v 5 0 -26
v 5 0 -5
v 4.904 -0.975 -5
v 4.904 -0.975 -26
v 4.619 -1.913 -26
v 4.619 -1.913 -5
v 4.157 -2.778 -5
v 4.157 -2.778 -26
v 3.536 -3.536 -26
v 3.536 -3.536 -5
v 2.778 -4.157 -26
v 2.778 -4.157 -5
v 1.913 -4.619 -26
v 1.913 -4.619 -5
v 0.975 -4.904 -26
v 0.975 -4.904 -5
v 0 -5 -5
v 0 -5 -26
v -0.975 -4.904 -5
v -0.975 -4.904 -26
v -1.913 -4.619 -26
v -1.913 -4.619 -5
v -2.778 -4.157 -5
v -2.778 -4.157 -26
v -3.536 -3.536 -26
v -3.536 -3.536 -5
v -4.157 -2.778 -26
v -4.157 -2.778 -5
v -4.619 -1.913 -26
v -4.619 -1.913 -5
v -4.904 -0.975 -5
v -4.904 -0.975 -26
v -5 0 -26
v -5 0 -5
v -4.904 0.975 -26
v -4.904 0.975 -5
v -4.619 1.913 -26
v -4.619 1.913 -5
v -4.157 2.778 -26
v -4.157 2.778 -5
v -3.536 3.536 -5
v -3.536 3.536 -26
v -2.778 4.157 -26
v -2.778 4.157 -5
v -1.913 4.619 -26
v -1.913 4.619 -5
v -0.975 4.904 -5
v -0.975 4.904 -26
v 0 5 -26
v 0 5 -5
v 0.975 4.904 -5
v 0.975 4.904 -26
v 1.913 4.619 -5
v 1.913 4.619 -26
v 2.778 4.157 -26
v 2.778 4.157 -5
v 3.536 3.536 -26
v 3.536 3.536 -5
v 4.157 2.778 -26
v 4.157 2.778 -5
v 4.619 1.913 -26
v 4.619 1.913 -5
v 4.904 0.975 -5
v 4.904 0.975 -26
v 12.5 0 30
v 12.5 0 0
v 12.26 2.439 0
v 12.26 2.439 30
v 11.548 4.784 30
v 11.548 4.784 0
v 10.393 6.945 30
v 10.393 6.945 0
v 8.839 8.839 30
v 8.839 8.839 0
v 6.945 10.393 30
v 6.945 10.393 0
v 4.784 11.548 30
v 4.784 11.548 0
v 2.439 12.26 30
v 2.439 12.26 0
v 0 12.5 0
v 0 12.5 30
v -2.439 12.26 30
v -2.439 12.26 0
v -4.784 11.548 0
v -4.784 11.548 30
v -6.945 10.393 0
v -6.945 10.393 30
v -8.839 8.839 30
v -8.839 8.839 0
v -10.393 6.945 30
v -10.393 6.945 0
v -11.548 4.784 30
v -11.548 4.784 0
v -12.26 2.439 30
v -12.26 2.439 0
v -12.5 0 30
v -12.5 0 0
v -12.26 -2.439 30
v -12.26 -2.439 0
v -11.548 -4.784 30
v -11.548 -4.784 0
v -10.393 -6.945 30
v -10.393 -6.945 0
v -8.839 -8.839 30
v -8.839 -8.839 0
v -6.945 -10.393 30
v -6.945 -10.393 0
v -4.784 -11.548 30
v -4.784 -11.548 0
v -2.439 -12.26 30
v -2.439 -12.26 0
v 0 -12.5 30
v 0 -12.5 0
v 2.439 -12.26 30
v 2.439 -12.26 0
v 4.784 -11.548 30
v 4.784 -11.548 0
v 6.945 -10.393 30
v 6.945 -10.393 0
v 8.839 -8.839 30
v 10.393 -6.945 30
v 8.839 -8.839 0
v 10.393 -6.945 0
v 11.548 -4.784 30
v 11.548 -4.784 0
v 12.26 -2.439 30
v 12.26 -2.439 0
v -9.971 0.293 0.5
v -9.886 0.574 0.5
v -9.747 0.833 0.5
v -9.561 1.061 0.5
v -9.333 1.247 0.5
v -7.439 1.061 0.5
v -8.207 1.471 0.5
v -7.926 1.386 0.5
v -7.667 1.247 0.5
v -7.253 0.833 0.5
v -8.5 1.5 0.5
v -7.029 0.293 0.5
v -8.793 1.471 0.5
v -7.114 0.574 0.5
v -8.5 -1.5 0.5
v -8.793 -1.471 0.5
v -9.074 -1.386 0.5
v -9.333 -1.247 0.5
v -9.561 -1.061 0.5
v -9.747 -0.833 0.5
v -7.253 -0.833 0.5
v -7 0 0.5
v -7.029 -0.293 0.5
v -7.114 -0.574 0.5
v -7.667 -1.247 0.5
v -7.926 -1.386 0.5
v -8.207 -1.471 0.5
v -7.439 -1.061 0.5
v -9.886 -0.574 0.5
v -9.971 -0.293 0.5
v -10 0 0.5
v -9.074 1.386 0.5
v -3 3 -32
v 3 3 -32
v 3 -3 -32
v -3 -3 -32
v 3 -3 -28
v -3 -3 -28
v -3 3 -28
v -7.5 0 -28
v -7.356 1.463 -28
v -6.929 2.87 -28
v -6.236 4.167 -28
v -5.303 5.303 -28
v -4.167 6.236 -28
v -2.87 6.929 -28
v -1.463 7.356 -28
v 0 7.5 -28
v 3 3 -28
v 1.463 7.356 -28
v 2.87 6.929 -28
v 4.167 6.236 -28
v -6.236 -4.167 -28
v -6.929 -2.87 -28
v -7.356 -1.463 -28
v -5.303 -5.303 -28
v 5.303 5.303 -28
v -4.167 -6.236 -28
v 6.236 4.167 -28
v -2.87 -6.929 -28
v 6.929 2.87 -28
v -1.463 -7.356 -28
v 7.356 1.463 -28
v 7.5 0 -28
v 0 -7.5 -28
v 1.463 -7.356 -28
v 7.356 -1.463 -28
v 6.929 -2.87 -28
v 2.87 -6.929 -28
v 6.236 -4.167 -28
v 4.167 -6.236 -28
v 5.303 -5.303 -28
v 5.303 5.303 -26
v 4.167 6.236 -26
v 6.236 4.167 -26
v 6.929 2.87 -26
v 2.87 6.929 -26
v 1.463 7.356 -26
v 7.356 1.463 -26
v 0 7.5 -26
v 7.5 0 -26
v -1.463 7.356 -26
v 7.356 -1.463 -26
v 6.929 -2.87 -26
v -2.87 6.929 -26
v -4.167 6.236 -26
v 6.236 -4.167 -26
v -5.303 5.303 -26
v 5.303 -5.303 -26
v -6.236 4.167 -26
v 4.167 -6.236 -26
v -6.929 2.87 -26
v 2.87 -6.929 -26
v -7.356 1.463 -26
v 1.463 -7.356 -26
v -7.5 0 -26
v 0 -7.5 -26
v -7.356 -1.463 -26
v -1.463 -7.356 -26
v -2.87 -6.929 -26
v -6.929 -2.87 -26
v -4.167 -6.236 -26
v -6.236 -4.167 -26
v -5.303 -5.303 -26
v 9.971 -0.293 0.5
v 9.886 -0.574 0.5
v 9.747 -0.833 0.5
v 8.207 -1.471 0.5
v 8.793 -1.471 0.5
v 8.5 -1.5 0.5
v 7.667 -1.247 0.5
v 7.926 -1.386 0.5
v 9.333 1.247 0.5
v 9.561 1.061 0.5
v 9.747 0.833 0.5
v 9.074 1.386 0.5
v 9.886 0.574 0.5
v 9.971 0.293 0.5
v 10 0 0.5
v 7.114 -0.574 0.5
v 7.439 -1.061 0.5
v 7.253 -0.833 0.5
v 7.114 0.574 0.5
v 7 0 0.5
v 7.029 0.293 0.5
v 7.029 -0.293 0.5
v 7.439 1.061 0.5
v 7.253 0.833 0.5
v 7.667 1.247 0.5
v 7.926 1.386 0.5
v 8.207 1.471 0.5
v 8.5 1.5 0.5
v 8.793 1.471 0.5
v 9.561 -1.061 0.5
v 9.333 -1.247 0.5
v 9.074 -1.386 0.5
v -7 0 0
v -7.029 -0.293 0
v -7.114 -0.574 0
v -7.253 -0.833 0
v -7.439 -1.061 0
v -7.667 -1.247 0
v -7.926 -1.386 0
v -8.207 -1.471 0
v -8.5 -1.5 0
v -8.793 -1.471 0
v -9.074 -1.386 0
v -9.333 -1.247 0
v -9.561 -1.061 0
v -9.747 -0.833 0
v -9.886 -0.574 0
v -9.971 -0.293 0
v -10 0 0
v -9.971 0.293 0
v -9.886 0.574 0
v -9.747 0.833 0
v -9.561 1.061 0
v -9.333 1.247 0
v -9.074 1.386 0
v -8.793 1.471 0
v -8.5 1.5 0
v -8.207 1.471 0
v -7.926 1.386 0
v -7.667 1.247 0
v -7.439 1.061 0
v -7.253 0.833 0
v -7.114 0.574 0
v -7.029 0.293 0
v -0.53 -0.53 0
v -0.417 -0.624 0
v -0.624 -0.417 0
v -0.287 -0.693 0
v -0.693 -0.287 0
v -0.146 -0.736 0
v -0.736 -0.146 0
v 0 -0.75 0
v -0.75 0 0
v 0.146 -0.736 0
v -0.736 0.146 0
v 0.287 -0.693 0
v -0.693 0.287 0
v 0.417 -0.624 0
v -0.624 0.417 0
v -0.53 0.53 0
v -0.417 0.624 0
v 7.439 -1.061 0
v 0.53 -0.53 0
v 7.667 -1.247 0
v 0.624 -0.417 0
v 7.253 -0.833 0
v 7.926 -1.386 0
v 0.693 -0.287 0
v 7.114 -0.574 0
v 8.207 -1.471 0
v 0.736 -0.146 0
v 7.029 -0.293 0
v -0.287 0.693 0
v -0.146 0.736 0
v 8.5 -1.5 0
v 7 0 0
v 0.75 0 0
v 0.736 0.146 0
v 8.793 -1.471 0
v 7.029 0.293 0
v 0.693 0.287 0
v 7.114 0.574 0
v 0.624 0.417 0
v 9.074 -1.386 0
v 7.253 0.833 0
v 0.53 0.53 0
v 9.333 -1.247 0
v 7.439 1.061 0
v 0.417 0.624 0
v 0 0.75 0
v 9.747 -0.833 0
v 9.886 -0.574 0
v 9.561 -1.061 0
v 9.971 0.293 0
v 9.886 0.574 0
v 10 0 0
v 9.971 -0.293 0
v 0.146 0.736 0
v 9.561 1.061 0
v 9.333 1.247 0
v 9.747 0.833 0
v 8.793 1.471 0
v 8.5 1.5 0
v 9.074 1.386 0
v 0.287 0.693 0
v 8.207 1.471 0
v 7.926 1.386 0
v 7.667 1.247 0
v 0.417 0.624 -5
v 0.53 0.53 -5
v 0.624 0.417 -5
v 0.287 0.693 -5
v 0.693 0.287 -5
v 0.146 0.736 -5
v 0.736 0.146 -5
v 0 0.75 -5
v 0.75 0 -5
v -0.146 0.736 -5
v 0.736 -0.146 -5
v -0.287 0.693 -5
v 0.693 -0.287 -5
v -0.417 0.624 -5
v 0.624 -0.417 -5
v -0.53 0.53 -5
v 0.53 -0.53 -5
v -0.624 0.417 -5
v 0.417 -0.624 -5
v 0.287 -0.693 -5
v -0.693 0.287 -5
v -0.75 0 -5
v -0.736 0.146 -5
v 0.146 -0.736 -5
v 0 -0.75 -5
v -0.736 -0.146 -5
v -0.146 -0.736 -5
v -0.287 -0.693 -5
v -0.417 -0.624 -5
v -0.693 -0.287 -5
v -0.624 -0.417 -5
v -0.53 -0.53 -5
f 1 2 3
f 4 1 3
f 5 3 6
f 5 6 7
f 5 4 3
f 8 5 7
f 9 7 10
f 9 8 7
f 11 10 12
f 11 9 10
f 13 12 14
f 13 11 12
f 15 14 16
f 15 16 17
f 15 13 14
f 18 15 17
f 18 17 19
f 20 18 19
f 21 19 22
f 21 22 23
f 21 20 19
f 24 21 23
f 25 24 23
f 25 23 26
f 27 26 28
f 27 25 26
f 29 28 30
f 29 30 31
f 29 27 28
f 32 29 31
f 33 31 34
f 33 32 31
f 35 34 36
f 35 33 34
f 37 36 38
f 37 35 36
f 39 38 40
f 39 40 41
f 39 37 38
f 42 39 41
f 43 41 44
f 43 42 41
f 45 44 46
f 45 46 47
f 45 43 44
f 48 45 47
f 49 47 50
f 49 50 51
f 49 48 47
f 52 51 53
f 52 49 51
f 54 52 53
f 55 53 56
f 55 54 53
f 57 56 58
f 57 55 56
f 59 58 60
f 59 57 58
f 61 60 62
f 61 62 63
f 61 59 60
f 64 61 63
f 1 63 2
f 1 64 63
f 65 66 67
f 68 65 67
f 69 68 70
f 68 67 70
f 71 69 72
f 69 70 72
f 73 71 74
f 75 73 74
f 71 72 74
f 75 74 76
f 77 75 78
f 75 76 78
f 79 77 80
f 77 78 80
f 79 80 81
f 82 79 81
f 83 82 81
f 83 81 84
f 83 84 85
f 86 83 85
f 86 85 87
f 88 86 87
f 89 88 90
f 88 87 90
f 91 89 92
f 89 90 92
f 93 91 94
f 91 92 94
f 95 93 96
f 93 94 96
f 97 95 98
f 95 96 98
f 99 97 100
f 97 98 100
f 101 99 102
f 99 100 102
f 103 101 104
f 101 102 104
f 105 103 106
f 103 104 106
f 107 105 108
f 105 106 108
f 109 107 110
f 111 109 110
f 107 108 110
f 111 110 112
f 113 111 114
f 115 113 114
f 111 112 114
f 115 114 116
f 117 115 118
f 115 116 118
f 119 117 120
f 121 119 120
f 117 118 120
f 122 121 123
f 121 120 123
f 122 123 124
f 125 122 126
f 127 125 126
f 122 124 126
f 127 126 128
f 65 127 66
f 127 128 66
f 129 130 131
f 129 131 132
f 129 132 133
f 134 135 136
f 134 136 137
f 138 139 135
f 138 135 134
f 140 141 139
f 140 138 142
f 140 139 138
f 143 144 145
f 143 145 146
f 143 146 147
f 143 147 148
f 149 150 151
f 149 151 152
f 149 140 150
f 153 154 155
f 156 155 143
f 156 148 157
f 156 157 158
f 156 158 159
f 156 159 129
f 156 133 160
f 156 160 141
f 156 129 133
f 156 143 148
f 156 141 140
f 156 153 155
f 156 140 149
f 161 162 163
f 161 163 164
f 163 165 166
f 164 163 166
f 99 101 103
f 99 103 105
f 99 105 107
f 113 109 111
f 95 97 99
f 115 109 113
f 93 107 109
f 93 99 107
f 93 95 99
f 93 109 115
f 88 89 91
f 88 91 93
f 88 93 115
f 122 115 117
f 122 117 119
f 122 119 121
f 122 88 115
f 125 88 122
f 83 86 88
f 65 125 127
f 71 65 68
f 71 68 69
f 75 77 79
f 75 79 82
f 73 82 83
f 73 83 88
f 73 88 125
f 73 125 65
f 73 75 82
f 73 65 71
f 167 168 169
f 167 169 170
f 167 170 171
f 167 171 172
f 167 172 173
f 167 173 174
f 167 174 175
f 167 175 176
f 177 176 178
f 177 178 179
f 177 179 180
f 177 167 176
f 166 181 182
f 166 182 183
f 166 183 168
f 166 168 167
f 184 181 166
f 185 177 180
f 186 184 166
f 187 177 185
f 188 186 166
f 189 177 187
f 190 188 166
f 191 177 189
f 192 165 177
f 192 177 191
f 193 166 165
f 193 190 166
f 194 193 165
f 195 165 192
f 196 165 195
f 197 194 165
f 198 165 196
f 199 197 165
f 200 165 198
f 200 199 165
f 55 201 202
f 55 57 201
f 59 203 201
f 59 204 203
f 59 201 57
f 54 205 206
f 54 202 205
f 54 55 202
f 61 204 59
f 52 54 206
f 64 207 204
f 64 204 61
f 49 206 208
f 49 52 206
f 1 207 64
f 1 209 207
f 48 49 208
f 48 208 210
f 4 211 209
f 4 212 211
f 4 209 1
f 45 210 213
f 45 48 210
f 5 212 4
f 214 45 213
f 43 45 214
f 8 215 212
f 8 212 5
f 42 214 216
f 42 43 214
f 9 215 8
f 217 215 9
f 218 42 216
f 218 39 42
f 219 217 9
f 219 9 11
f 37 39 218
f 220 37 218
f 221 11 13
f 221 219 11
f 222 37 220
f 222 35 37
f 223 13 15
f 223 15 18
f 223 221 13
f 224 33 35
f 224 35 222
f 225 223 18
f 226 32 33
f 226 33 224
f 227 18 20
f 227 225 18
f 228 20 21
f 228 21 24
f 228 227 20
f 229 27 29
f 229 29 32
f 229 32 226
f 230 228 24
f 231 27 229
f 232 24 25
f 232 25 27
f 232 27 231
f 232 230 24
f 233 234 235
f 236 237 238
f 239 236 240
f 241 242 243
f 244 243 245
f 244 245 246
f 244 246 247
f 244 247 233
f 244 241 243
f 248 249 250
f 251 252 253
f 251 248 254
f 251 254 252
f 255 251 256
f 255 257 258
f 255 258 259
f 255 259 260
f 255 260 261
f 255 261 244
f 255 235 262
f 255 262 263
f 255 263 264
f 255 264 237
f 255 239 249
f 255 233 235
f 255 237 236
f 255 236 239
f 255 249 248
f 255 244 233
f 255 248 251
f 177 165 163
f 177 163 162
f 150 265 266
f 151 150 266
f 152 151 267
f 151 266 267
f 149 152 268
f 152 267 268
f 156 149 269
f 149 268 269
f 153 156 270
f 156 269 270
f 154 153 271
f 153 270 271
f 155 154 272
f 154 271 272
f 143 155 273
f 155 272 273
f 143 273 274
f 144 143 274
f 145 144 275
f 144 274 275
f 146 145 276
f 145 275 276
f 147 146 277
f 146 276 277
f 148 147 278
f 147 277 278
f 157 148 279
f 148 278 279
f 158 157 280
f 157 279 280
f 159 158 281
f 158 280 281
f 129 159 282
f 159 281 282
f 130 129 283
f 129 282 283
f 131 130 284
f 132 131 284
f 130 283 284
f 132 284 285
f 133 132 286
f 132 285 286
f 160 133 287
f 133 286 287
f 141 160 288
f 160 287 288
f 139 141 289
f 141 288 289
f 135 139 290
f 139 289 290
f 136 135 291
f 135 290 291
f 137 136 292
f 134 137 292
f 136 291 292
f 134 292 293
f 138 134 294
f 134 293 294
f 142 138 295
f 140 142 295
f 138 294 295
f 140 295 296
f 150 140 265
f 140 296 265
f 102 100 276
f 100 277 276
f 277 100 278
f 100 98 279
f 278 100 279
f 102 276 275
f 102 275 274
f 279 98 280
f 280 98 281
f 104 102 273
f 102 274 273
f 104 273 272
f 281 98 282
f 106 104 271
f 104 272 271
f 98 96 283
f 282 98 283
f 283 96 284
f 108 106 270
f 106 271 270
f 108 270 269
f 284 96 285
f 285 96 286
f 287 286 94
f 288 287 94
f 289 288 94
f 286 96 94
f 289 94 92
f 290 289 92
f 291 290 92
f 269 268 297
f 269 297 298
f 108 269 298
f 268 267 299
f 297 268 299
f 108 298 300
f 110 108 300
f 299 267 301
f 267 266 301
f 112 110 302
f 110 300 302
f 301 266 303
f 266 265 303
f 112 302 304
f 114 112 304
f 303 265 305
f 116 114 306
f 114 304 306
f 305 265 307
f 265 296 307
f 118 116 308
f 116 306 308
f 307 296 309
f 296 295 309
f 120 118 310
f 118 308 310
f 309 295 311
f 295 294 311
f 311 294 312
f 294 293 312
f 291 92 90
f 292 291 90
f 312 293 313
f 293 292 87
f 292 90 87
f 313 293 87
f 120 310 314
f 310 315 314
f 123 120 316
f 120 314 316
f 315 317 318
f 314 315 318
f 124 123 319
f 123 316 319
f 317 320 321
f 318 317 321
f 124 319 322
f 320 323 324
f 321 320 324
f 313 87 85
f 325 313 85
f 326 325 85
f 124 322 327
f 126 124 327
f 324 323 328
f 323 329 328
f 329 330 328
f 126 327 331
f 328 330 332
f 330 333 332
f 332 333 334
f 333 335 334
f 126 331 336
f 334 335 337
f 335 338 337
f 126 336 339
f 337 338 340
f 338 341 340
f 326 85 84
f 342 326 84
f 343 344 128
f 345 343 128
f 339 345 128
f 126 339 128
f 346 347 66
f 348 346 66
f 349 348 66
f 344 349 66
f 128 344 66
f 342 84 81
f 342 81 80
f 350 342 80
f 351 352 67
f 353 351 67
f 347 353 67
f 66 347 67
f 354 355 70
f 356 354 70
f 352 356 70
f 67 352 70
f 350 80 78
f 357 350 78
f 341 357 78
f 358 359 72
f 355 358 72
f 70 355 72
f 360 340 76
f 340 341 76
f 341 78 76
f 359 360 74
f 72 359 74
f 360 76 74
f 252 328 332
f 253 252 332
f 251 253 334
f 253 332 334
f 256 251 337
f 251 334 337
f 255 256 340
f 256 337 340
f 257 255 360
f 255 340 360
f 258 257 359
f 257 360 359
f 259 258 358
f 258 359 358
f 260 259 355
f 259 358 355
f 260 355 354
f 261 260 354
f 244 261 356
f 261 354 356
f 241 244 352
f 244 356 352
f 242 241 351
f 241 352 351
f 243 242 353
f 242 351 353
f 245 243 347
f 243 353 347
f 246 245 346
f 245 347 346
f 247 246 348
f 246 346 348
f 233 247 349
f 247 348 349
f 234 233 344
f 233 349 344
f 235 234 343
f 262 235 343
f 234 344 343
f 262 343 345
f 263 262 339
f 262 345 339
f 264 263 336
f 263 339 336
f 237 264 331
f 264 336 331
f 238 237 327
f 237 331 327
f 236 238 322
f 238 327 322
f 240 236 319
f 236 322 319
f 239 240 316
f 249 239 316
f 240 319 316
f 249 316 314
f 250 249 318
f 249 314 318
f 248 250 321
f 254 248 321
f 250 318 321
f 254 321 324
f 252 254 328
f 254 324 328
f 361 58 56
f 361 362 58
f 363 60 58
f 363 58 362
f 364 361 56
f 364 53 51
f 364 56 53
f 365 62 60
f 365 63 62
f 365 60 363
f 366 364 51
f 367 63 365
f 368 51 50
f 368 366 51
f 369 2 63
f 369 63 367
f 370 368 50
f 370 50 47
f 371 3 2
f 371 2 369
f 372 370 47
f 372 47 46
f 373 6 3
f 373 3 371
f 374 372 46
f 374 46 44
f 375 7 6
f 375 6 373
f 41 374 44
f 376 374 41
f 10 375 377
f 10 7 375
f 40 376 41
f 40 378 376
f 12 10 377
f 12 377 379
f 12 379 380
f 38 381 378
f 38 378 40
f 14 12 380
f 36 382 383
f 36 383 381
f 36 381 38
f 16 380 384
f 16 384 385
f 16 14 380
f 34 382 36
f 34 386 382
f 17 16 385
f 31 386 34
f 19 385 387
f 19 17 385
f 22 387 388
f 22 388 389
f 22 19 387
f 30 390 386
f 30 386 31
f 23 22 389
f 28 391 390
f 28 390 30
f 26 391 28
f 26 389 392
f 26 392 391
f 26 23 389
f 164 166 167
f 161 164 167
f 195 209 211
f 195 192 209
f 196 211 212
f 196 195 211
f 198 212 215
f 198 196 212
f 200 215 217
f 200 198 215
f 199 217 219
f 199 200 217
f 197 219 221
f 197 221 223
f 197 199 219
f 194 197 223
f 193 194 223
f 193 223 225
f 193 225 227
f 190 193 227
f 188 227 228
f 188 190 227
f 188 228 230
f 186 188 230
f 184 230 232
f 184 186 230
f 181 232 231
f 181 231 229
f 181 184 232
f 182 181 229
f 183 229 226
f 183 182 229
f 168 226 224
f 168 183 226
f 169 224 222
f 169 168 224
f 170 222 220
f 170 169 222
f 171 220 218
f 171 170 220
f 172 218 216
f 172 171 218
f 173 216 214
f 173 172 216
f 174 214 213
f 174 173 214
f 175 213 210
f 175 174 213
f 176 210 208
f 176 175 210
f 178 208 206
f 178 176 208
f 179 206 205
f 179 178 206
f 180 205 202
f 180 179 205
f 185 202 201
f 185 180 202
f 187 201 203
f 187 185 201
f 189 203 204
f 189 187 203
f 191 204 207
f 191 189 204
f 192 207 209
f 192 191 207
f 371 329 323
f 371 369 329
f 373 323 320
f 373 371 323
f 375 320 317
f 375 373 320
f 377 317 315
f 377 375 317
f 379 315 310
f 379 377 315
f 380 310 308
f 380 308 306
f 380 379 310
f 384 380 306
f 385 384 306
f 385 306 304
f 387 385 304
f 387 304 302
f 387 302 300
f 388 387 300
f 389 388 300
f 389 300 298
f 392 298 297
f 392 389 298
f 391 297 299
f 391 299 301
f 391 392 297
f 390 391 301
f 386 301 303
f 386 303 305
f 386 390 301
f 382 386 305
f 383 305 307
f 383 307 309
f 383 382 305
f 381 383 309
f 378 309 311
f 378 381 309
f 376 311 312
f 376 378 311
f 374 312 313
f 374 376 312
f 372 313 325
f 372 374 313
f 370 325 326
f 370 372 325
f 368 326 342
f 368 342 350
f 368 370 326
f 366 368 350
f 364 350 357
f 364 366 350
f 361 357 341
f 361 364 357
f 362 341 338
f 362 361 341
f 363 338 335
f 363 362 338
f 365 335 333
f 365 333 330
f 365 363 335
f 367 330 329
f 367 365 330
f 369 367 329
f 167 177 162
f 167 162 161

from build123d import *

# Parameters (mm, degrees)
SKETCH_1_R          = 12.5
EXTRUDE_1_DEPTH     = 30
SKETCH_4_R          = 1.5
CUT_EXTRUDE_1_DEPTH = 0.5
SKETCH_3_W          = 6
SKETCH_3_H          = 6
EXTRUDE_2_DEPTH     = 4


with BuildPart() as part:
    # 草图1 → 凸台-拉伸1 (new body)
    with BuildSketch(Plane.XY):
        Circle(SKETCH_1_R)
    extrude(amount=EXTRUDE_1_DEPTH)

    # 草图4 → 切除-拉伸1 (cut)
    with BuildSketch(Plane(origin=(0, 0, 0), x_dir=(-1, 0, 0), z_dir=(0, 0, -1))):
        with Locations((-8.5, 0)):
            Circle(SKETCH_4_R)
        with Locations(Location((8.5, 0, 0), (0, 0, 180))):
            Circle(SKETCH_4_R)
    extrude(amount=-CUT_EXTRUDE_1_DEPTH, mode=Mode.SUBTRACT)

    # 草图2 → 旋转2 (revolve)
    with BuildSketch(Plane(origin=(0, 0, 0), x_dir=(1, 0, 0), z_dir=(0, 1, 0))):
        Polygon((5, 28), (0, 28), (0, 0), (0.75, 0), (0.75, 5), (5, 5), (5, 26), (7.5, 26), (7.5, 28), align=None)
    revolve(axis=Axis((0, 0, 1000), (0, 0, -1)))

    # 草图3 → 凸台-拉伸2 (add)
    with BuildSketch(Plane(origin=(0, 0, -28), x_dir=(-1, 0, 0), z_dir=(0, 0, -1))):
        Rectangle(SKETCH_3_W, SKETCH_3_H)
    extrude(amount=EXTRUDE_2_DEPTH)


solid = part.part
